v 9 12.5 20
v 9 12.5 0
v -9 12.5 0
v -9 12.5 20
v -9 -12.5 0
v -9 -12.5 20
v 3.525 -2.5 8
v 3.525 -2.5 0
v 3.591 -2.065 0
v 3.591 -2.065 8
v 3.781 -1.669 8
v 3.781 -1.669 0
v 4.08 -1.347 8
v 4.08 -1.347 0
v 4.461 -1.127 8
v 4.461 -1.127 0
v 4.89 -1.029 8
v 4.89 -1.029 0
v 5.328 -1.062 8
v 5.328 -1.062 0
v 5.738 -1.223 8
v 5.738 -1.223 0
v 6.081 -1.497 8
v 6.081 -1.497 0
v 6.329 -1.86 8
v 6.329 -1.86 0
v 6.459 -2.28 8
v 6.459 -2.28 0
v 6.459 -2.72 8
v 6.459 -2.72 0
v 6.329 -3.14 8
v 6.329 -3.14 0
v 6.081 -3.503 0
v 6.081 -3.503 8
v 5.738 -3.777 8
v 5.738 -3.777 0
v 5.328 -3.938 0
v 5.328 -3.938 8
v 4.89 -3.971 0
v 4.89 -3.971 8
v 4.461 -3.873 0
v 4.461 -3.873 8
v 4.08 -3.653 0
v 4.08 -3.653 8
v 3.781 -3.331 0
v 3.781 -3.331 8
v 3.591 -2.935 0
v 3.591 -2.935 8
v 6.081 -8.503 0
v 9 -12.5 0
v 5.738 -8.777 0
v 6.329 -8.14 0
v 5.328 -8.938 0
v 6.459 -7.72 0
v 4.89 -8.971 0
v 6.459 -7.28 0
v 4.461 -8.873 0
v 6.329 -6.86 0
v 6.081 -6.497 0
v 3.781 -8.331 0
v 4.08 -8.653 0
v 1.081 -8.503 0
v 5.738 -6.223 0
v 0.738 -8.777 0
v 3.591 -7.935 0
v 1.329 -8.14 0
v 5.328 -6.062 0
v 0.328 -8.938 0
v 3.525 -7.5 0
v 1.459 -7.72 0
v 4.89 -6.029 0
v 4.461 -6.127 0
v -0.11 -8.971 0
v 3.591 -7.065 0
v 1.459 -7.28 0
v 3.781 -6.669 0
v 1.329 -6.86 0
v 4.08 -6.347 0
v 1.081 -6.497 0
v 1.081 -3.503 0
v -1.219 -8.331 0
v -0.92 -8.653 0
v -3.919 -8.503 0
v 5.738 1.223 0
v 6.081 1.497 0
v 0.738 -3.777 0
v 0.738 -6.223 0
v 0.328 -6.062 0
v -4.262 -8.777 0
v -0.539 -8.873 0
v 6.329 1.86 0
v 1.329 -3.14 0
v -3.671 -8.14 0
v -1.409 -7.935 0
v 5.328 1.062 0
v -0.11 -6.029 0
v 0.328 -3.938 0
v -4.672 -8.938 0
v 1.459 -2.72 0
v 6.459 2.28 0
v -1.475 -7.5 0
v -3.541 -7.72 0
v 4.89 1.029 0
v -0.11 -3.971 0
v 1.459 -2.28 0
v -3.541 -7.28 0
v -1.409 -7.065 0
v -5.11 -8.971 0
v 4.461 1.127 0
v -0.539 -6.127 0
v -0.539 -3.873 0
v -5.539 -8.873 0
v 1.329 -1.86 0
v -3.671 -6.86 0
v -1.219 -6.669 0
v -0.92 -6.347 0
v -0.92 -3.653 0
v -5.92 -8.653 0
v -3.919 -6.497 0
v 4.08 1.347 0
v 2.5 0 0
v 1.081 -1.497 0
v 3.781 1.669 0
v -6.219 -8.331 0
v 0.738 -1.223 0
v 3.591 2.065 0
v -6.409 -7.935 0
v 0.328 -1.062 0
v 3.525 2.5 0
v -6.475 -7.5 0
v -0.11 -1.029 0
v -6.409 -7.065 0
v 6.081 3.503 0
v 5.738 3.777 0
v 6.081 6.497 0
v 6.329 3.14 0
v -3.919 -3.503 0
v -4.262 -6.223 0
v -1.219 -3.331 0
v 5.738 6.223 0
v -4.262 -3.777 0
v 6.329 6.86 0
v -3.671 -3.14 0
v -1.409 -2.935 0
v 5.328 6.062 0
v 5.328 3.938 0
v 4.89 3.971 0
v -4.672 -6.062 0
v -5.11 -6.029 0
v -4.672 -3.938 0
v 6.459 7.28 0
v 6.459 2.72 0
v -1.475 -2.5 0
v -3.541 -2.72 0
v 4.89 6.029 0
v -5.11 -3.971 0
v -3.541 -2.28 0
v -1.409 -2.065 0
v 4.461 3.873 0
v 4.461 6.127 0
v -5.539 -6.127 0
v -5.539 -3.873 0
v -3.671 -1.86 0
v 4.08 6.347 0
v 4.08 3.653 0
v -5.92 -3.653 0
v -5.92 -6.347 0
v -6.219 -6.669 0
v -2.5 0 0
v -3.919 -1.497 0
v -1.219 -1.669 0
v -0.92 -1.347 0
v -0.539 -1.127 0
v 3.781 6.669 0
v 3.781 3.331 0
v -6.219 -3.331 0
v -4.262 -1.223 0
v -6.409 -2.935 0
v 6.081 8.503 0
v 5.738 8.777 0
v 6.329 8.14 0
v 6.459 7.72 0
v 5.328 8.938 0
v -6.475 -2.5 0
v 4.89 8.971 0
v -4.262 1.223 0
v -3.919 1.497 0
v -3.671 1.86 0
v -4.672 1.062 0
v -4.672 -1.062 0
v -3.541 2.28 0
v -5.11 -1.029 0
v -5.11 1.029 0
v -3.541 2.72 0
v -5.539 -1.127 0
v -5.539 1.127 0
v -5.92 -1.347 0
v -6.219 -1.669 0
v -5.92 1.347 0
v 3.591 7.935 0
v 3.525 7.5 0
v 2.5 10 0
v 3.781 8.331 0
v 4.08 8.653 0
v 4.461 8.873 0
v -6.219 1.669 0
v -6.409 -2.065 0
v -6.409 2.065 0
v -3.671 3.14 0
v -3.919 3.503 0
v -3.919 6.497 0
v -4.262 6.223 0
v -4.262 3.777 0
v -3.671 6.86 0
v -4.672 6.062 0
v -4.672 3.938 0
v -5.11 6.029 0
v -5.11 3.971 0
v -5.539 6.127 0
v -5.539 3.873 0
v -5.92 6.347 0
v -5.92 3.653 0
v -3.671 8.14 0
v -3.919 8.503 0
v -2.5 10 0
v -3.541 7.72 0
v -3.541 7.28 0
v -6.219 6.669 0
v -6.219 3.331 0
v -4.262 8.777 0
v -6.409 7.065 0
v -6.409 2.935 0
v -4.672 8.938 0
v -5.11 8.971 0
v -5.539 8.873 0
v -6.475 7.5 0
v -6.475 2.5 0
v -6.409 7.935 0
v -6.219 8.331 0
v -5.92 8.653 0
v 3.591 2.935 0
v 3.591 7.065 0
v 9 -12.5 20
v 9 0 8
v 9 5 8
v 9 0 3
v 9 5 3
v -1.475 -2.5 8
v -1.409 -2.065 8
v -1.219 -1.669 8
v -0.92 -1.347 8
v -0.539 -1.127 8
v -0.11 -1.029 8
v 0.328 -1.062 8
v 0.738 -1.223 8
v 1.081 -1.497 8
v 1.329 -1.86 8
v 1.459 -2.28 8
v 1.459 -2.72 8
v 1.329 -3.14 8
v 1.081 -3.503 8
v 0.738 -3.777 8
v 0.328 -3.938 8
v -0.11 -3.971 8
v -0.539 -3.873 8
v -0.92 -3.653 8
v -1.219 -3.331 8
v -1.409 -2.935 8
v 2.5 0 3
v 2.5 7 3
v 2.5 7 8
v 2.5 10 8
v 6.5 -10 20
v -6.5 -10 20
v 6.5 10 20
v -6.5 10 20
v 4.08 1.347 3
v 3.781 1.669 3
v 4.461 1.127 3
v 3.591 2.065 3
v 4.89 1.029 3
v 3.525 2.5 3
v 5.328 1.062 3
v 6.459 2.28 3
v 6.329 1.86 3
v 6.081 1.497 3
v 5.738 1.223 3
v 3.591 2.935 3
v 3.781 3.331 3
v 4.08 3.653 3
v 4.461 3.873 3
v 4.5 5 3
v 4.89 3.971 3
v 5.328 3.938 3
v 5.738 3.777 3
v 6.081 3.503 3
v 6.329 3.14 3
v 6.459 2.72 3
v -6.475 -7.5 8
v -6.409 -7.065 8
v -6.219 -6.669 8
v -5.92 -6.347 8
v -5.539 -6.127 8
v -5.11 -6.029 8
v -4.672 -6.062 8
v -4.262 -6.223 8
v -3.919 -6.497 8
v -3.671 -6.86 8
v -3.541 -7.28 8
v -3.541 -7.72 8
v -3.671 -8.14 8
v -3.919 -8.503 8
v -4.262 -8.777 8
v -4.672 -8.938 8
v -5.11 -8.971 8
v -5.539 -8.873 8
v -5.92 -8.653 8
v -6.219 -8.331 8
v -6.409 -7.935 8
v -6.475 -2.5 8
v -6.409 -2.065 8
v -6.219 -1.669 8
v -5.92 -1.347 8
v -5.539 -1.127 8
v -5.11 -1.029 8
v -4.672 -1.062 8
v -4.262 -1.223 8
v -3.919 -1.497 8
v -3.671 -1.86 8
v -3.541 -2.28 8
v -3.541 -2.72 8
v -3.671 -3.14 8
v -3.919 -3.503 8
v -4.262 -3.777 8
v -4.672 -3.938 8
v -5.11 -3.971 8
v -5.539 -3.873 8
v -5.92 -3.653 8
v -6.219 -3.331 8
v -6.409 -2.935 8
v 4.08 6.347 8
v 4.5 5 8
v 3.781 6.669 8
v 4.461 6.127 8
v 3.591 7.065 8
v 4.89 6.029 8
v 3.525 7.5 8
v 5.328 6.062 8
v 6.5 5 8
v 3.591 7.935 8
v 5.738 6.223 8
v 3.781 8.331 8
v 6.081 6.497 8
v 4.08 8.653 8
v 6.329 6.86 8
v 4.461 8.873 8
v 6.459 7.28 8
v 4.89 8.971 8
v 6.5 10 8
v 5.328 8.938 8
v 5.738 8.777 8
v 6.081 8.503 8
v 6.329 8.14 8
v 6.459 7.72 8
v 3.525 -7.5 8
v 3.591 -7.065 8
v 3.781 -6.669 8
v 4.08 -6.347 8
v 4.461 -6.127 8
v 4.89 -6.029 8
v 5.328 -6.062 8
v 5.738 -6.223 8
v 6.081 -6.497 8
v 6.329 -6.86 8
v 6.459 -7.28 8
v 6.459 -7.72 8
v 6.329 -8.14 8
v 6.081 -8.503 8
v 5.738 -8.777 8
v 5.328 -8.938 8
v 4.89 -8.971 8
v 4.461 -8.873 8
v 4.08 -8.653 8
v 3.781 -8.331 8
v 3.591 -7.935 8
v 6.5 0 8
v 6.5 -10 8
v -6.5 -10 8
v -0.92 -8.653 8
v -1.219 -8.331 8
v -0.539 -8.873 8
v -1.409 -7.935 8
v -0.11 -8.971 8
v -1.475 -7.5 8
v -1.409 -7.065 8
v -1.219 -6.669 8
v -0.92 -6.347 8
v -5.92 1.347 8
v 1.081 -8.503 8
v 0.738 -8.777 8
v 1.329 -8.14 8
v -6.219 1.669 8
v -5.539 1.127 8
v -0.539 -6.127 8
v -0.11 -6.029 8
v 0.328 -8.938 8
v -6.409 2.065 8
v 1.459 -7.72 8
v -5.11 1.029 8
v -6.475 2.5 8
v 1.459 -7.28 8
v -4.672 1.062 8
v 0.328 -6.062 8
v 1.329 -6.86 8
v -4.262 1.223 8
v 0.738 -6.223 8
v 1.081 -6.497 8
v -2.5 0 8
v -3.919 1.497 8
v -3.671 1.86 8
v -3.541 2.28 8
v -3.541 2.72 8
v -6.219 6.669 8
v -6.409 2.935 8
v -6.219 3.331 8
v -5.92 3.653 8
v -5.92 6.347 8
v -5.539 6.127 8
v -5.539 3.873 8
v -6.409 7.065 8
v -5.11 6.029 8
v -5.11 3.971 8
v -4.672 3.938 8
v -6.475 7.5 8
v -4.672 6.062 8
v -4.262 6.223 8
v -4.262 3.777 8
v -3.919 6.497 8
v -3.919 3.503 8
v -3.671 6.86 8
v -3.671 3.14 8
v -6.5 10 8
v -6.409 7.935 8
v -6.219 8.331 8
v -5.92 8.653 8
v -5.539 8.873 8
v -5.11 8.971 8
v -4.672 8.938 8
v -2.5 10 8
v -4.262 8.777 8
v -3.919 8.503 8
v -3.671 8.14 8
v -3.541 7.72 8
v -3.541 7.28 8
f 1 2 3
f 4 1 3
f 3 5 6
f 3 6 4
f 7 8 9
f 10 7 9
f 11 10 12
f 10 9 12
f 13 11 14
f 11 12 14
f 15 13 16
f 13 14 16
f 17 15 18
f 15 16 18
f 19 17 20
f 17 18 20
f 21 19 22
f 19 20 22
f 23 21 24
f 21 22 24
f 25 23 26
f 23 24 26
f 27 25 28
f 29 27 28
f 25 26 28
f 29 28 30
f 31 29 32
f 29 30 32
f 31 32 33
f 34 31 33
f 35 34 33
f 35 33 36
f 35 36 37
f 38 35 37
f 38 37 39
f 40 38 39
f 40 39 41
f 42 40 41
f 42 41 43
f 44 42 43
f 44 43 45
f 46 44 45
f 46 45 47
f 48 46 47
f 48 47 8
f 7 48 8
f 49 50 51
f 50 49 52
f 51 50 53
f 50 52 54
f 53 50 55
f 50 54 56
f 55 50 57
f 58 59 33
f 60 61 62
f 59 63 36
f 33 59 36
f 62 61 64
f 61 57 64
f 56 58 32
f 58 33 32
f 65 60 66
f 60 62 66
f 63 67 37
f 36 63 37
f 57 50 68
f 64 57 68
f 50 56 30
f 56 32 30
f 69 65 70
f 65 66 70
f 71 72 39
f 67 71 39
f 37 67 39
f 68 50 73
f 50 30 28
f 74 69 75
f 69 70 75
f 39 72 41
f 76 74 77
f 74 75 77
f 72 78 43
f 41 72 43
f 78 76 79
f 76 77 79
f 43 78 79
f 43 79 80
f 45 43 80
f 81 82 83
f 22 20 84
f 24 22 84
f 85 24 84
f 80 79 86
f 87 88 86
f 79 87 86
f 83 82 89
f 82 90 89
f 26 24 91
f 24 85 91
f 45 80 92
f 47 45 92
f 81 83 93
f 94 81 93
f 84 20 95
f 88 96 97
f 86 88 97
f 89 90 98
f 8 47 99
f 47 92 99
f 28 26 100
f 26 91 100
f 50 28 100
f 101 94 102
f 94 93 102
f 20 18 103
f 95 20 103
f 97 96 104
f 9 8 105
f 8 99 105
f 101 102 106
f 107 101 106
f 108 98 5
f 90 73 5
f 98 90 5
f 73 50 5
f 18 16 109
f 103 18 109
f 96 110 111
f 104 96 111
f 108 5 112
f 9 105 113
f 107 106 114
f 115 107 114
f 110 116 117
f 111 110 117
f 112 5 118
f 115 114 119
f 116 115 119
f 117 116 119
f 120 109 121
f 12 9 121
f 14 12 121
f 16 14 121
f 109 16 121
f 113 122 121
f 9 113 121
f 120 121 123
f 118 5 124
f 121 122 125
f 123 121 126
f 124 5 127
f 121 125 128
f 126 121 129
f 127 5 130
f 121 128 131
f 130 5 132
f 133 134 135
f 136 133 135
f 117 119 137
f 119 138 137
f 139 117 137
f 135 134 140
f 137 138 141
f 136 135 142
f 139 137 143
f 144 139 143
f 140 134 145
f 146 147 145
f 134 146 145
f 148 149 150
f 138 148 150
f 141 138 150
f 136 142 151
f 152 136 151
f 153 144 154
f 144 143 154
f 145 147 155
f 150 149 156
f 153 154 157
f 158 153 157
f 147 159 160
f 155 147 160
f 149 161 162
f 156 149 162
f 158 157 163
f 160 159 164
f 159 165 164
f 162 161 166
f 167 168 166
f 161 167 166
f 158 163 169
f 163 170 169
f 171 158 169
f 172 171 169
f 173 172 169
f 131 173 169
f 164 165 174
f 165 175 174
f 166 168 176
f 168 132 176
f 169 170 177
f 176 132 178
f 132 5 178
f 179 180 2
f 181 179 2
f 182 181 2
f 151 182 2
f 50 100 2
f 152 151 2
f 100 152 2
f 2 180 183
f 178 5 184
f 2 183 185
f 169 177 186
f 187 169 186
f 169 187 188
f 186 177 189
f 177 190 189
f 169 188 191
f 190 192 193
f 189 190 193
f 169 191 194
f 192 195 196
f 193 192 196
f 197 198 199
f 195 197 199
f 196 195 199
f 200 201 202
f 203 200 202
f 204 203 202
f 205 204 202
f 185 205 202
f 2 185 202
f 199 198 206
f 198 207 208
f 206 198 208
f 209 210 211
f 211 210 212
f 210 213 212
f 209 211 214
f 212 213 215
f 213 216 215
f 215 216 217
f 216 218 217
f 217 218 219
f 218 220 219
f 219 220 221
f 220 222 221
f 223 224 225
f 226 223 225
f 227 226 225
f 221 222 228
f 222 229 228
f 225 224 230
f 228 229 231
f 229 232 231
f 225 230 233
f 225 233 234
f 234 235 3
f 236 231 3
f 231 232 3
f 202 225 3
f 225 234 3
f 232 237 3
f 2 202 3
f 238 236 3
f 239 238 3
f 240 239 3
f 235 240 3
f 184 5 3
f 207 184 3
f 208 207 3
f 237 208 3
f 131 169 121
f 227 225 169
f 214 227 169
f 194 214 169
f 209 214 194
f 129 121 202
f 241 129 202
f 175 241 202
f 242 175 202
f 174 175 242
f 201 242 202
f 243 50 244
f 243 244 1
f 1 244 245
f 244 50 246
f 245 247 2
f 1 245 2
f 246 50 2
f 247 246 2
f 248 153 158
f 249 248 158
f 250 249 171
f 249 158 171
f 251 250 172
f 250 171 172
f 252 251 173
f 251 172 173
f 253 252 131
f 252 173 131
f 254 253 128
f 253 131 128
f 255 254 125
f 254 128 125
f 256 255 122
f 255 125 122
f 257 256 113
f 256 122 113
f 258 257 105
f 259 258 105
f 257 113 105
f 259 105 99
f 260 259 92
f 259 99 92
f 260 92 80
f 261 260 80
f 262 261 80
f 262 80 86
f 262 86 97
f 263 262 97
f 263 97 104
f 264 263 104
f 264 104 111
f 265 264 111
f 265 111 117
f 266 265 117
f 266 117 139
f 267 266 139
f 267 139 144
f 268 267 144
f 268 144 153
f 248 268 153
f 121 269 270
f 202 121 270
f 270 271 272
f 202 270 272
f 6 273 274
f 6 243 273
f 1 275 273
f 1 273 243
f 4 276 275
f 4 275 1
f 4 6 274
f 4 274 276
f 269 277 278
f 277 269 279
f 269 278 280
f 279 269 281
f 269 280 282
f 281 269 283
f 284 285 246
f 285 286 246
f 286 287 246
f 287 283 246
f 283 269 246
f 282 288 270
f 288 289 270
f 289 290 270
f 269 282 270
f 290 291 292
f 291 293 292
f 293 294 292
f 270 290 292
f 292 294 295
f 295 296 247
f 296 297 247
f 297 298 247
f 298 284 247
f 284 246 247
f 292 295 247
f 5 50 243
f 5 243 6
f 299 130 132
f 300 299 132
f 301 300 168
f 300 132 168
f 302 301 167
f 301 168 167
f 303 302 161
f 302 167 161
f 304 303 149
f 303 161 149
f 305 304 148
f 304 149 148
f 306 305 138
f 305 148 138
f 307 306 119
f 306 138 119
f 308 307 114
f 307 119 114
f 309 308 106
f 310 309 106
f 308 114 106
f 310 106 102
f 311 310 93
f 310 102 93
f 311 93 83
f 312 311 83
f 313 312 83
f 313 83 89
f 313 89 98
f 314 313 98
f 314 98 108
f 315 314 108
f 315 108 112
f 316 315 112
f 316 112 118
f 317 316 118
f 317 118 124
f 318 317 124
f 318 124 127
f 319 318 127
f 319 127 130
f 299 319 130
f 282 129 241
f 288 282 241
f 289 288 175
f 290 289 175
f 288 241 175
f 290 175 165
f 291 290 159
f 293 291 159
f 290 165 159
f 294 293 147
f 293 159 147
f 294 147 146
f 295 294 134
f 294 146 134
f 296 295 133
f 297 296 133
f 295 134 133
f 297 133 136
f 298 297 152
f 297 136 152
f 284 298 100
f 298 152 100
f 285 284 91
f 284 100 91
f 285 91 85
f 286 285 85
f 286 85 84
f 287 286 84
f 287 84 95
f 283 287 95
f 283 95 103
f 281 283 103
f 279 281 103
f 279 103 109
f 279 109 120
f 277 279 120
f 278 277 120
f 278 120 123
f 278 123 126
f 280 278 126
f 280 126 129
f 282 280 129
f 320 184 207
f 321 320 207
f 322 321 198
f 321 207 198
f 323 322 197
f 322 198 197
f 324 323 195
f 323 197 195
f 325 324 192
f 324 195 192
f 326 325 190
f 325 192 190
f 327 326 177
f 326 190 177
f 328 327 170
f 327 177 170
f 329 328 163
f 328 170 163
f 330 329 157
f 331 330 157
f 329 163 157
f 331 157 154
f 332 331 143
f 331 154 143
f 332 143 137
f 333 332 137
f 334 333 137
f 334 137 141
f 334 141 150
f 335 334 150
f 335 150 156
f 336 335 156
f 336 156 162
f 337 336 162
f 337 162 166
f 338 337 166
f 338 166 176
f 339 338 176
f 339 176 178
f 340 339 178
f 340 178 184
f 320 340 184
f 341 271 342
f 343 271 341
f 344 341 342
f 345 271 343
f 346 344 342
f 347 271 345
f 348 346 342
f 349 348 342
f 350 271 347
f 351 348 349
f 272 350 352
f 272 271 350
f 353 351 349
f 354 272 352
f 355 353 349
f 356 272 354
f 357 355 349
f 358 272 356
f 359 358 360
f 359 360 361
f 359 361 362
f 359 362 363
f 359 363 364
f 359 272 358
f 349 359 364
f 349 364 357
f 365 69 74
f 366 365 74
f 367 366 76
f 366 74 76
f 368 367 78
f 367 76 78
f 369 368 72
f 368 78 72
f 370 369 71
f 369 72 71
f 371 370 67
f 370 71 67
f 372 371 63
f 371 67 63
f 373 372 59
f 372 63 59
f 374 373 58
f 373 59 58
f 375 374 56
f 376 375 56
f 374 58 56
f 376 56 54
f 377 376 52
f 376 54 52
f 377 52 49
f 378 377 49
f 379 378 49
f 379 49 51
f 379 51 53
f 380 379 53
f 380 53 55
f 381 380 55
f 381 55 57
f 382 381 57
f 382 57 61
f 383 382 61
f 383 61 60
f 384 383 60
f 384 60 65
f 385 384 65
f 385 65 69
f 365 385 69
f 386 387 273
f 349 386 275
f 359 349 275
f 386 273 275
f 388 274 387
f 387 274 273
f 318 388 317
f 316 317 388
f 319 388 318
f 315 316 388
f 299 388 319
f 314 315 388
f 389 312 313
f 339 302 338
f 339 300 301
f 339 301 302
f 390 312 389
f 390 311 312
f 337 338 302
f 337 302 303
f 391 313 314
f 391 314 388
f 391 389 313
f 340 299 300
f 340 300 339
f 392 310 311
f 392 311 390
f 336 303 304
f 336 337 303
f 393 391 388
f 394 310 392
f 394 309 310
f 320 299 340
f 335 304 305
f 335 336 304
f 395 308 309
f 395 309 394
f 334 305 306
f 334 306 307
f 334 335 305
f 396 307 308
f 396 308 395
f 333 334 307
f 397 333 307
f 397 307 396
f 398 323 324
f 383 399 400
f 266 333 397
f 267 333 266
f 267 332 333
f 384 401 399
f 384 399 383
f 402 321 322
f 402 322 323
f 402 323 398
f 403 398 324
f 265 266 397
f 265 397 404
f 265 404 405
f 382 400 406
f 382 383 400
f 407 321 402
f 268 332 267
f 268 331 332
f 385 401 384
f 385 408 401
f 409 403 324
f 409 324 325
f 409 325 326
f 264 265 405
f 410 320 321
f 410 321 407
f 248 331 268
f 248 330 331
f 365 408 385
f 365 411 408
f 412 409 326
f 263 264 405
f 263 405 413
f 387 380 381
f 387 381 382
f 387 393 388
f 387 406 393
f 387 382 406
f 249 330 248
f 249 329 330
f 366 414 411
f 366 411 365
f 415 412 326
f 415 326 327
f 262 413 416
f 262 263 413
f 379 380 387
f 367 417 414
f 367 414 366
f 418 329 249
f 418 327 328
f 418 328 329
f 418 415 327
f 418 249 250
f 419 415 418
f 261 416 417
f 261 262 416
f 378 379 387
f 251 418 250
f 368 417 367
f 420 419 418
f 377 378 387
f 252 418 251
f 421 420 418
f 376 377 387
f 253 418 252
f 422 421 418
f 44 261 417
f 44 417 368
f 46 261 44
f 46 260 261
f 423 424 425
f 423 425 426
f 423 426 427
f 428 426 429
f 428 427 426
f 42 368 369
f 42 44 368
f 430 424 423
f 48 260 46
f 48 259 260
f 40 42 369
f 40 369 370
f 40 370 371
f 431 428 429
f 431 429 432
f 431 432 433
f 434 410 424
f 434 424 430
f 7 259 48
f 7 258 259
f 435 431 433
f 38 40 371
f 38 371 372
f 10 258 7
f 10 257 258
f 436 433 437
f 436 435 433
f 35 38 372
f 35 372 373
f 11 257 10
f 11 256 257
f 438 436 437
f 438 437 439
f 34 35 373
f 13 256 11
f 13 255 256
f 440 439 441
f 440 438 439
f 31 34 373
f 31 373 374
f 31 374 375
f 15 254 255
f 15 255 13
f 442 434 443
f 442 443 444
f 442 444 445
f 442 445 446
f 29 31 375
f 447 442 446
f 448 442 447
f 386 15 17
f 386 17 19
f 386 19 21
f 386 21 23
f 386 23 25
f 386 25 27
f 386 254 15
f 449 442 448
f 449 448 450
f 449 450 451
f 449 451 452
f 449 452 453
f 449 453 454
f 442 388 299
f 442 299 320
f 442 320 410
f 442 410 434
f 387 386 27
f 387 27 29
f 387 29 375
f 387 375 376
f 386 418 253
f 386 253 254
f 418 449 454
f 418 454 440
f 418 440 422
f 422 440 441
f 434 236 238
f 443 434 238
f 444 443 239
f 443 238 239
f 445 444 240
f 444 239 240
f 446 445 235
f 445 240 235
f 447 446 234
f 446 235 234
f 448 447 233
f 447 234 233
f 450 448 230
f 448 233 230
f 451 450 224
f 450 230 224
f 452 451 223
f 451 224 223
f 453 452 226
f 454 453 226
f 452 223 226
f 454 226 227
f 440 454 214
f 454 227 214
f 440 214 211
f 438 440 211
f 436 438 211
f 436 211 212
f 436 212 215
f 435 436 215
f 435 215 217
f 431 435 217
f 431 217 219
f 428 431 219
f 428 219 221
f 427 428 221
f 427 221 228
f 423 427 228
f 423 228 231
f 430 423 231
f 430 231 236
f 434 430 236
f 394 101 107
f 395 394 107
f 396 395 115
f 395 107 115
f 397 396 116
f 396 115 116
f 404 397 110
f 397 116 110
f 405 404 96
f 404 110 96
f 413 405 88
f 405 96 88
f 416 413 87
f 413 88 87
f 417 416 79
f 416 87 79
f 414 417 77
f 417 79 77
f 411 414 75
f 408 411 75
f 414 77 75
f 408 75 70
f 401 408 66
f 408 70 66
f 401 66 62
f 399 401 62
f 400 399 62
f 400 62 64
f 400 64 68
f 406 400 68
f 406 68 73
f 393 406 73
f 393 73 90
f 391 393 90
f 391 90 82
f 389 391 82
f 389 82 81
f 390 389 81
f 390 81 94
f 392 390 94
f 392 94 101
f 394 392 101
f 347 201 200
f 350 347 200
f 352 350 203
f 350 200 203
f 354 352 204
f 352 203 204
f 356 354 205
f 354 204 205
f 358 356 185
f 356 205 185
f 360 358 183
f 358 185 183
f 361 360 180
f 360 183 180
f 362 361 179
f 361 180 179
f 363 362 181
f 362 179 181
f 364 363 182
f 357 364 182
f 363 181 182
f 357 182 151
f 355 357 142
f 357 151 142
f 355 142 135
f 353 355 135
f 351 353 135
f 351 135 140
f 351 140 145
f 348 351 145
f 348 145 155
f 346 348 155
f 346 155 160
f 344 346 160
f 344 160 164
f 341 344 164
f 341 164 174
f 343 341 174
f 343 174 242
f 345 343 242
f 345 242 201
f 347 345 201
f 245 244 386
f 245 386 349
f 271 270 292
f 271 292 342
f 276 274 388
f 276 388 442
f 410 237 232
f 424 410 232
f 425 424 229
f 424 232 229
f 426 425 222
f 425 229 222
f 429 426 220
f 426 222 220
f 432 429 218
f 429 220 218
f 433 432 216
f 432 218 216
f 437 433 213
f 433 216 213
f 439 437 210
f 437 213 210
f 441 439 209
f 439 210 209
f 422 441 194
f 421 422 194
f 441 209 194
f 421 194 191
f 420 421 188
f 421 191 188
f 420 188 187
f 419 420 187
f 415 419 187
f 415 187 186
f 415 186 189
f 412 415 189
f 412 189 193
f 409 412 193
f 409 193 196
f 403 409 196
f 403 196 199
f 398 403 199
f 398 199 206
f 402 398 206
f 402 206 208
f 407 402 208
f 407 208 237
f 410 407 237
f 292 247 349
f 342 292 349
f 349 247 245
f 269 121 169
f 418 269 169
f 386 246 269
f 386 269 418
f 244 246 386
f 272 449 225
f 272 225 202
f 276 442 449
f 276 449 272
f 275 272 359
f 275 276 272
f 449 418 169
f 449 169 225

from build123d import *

# Parameters (mm, degrees)
SKETCH1_W            = 25
SKETCH1_H            = 18
BOSS_EXTRUDE1_DEPTH  = 20
SKETCH2_W            = 13
SKETCH2_H            = 20
CUT_EXTRUDE1_DEPTH   = 12
SKETCH5_W            = 5
SKETCH5_H            = 10
CUT_EXTRUDE4_DEPTH   = 8
SKETCH3_R            = 1.475
CUT_EXTRUDE2_DEPTH   = 10
LPATTERN1_COUNT      = 3
LPATTERN1_PITCH      = 5
LPATTERN1_COUNT_DIR2 = 4
LPATTERN1_PITCH_DIR2 = 5
CUT_EXTRUDE3_REACH   = 31.669
SKETCH4_W            = 5
SKETCH4_H            = 5
CHAMFER1_SIZE        = 2


with BuildPart() as part:
    # Sketch1 → Boss-Extrude1 (new body)
    with BuildSketch(Plane(origin=(0, 0, 0), x_dir=(0, 1, 0), z_dir=(0, 0, 1))):
        Rectangle(SKETCH1_W, SKETCH1_H)
    extrude(amount=BOSS_EXTRUDE1_DEPTH)

    # Sketch2 → Cut-Extrude1 (cut)
    with BuildSketch(Plane.XY.offset(20)):
        Rectangle(SKETCH2_W, SKETCH2_H)
    extrude(amount=-CUT_EXTRUDE1_DEPTH, mode=Mode.SUBTRACT)

    # Sketch5 → Cut-Extrude4 (cut)
    with BuildSketch(Plane.XY.offset(8)):
        with Locations((0, 5)):
            Rectangle(SKETCH5_W, SKETCH5_H)
    extrude(amount=-CUT_EXTRUDE4_DEPTH, mode=Mode.SUBTRACT)

    # Sketch3 → Cut-Extrude2 (cut)
    with BuildSketch(Plane(origin=(0, 0, 0), x_dir=(1, 0, 0), z_dir=(0, 0, -1))):
        with Locations(Location((-5, 7.5, 0), (0, 0, 180))):
            Circle(SKETCH3_R)
    cut_extrude2 = extrude(amount=-CUT_EXTRUDE2_DEPTH, mode=Mode.SUBTRACT)

    # LPattern1: Cut-Extrude2 3 × 4, 2 skipped
    with Locations(*[(i * LPATTERN1_PITCH, j * LPATTERN1_PITCH_DIR2, 0) for i in range(LPATTERN1_COUNT) for j in range(LPATTERN1_COUNT_DIR2) if (i, j) not in ((0, 0), (1, 2), (1, 3))]):
        add(cut_extrude2, mode=Mode.SUBTRACT)

    # Cut-Extrude3: up to this face of the body (flat: up to its plane)
    cut_extrude3_end = Plane(part.part.faces().sort_by_distance((2.5, 5, 4))[0])
    # Sketch4 → Cut-Extrude3 (cut, up to the picked face)
    with BuildSketch(Plane.YZ.offset(9), mode=Mode.PRIVATE) as cut_extrude3_sk1:
        with Locations((2.5, 5.5)):
            Rectangle(SKETCH4_W, SKETCH4_H)
    cut_extrude3_tool1 = split(extrude(cut_extrude3_sk1.sketch, amount=-CUT_EXTRUDE3_REACH, mode=Mode.PRIVATE), bisect_by=cut_extrude3_end, keep=Keep.BOTH, mode=Mode.PRIVATE)
    add(cut_extrude3_tool1.solids().sort_by(Axis((9, 2.5, 5.5), (-1, 0, 0)))[0], mode=Mode.SUBTRACT)

    # Chamfer1
    chamfer1_edges = [part.edges().sort_by_distance(p)[0] for p in [
        (2.5, 5, 5.5),
    ]]
    chamfer(chamfer1_edges, length=CHAMFER1_SIZE)


solid = part.part
